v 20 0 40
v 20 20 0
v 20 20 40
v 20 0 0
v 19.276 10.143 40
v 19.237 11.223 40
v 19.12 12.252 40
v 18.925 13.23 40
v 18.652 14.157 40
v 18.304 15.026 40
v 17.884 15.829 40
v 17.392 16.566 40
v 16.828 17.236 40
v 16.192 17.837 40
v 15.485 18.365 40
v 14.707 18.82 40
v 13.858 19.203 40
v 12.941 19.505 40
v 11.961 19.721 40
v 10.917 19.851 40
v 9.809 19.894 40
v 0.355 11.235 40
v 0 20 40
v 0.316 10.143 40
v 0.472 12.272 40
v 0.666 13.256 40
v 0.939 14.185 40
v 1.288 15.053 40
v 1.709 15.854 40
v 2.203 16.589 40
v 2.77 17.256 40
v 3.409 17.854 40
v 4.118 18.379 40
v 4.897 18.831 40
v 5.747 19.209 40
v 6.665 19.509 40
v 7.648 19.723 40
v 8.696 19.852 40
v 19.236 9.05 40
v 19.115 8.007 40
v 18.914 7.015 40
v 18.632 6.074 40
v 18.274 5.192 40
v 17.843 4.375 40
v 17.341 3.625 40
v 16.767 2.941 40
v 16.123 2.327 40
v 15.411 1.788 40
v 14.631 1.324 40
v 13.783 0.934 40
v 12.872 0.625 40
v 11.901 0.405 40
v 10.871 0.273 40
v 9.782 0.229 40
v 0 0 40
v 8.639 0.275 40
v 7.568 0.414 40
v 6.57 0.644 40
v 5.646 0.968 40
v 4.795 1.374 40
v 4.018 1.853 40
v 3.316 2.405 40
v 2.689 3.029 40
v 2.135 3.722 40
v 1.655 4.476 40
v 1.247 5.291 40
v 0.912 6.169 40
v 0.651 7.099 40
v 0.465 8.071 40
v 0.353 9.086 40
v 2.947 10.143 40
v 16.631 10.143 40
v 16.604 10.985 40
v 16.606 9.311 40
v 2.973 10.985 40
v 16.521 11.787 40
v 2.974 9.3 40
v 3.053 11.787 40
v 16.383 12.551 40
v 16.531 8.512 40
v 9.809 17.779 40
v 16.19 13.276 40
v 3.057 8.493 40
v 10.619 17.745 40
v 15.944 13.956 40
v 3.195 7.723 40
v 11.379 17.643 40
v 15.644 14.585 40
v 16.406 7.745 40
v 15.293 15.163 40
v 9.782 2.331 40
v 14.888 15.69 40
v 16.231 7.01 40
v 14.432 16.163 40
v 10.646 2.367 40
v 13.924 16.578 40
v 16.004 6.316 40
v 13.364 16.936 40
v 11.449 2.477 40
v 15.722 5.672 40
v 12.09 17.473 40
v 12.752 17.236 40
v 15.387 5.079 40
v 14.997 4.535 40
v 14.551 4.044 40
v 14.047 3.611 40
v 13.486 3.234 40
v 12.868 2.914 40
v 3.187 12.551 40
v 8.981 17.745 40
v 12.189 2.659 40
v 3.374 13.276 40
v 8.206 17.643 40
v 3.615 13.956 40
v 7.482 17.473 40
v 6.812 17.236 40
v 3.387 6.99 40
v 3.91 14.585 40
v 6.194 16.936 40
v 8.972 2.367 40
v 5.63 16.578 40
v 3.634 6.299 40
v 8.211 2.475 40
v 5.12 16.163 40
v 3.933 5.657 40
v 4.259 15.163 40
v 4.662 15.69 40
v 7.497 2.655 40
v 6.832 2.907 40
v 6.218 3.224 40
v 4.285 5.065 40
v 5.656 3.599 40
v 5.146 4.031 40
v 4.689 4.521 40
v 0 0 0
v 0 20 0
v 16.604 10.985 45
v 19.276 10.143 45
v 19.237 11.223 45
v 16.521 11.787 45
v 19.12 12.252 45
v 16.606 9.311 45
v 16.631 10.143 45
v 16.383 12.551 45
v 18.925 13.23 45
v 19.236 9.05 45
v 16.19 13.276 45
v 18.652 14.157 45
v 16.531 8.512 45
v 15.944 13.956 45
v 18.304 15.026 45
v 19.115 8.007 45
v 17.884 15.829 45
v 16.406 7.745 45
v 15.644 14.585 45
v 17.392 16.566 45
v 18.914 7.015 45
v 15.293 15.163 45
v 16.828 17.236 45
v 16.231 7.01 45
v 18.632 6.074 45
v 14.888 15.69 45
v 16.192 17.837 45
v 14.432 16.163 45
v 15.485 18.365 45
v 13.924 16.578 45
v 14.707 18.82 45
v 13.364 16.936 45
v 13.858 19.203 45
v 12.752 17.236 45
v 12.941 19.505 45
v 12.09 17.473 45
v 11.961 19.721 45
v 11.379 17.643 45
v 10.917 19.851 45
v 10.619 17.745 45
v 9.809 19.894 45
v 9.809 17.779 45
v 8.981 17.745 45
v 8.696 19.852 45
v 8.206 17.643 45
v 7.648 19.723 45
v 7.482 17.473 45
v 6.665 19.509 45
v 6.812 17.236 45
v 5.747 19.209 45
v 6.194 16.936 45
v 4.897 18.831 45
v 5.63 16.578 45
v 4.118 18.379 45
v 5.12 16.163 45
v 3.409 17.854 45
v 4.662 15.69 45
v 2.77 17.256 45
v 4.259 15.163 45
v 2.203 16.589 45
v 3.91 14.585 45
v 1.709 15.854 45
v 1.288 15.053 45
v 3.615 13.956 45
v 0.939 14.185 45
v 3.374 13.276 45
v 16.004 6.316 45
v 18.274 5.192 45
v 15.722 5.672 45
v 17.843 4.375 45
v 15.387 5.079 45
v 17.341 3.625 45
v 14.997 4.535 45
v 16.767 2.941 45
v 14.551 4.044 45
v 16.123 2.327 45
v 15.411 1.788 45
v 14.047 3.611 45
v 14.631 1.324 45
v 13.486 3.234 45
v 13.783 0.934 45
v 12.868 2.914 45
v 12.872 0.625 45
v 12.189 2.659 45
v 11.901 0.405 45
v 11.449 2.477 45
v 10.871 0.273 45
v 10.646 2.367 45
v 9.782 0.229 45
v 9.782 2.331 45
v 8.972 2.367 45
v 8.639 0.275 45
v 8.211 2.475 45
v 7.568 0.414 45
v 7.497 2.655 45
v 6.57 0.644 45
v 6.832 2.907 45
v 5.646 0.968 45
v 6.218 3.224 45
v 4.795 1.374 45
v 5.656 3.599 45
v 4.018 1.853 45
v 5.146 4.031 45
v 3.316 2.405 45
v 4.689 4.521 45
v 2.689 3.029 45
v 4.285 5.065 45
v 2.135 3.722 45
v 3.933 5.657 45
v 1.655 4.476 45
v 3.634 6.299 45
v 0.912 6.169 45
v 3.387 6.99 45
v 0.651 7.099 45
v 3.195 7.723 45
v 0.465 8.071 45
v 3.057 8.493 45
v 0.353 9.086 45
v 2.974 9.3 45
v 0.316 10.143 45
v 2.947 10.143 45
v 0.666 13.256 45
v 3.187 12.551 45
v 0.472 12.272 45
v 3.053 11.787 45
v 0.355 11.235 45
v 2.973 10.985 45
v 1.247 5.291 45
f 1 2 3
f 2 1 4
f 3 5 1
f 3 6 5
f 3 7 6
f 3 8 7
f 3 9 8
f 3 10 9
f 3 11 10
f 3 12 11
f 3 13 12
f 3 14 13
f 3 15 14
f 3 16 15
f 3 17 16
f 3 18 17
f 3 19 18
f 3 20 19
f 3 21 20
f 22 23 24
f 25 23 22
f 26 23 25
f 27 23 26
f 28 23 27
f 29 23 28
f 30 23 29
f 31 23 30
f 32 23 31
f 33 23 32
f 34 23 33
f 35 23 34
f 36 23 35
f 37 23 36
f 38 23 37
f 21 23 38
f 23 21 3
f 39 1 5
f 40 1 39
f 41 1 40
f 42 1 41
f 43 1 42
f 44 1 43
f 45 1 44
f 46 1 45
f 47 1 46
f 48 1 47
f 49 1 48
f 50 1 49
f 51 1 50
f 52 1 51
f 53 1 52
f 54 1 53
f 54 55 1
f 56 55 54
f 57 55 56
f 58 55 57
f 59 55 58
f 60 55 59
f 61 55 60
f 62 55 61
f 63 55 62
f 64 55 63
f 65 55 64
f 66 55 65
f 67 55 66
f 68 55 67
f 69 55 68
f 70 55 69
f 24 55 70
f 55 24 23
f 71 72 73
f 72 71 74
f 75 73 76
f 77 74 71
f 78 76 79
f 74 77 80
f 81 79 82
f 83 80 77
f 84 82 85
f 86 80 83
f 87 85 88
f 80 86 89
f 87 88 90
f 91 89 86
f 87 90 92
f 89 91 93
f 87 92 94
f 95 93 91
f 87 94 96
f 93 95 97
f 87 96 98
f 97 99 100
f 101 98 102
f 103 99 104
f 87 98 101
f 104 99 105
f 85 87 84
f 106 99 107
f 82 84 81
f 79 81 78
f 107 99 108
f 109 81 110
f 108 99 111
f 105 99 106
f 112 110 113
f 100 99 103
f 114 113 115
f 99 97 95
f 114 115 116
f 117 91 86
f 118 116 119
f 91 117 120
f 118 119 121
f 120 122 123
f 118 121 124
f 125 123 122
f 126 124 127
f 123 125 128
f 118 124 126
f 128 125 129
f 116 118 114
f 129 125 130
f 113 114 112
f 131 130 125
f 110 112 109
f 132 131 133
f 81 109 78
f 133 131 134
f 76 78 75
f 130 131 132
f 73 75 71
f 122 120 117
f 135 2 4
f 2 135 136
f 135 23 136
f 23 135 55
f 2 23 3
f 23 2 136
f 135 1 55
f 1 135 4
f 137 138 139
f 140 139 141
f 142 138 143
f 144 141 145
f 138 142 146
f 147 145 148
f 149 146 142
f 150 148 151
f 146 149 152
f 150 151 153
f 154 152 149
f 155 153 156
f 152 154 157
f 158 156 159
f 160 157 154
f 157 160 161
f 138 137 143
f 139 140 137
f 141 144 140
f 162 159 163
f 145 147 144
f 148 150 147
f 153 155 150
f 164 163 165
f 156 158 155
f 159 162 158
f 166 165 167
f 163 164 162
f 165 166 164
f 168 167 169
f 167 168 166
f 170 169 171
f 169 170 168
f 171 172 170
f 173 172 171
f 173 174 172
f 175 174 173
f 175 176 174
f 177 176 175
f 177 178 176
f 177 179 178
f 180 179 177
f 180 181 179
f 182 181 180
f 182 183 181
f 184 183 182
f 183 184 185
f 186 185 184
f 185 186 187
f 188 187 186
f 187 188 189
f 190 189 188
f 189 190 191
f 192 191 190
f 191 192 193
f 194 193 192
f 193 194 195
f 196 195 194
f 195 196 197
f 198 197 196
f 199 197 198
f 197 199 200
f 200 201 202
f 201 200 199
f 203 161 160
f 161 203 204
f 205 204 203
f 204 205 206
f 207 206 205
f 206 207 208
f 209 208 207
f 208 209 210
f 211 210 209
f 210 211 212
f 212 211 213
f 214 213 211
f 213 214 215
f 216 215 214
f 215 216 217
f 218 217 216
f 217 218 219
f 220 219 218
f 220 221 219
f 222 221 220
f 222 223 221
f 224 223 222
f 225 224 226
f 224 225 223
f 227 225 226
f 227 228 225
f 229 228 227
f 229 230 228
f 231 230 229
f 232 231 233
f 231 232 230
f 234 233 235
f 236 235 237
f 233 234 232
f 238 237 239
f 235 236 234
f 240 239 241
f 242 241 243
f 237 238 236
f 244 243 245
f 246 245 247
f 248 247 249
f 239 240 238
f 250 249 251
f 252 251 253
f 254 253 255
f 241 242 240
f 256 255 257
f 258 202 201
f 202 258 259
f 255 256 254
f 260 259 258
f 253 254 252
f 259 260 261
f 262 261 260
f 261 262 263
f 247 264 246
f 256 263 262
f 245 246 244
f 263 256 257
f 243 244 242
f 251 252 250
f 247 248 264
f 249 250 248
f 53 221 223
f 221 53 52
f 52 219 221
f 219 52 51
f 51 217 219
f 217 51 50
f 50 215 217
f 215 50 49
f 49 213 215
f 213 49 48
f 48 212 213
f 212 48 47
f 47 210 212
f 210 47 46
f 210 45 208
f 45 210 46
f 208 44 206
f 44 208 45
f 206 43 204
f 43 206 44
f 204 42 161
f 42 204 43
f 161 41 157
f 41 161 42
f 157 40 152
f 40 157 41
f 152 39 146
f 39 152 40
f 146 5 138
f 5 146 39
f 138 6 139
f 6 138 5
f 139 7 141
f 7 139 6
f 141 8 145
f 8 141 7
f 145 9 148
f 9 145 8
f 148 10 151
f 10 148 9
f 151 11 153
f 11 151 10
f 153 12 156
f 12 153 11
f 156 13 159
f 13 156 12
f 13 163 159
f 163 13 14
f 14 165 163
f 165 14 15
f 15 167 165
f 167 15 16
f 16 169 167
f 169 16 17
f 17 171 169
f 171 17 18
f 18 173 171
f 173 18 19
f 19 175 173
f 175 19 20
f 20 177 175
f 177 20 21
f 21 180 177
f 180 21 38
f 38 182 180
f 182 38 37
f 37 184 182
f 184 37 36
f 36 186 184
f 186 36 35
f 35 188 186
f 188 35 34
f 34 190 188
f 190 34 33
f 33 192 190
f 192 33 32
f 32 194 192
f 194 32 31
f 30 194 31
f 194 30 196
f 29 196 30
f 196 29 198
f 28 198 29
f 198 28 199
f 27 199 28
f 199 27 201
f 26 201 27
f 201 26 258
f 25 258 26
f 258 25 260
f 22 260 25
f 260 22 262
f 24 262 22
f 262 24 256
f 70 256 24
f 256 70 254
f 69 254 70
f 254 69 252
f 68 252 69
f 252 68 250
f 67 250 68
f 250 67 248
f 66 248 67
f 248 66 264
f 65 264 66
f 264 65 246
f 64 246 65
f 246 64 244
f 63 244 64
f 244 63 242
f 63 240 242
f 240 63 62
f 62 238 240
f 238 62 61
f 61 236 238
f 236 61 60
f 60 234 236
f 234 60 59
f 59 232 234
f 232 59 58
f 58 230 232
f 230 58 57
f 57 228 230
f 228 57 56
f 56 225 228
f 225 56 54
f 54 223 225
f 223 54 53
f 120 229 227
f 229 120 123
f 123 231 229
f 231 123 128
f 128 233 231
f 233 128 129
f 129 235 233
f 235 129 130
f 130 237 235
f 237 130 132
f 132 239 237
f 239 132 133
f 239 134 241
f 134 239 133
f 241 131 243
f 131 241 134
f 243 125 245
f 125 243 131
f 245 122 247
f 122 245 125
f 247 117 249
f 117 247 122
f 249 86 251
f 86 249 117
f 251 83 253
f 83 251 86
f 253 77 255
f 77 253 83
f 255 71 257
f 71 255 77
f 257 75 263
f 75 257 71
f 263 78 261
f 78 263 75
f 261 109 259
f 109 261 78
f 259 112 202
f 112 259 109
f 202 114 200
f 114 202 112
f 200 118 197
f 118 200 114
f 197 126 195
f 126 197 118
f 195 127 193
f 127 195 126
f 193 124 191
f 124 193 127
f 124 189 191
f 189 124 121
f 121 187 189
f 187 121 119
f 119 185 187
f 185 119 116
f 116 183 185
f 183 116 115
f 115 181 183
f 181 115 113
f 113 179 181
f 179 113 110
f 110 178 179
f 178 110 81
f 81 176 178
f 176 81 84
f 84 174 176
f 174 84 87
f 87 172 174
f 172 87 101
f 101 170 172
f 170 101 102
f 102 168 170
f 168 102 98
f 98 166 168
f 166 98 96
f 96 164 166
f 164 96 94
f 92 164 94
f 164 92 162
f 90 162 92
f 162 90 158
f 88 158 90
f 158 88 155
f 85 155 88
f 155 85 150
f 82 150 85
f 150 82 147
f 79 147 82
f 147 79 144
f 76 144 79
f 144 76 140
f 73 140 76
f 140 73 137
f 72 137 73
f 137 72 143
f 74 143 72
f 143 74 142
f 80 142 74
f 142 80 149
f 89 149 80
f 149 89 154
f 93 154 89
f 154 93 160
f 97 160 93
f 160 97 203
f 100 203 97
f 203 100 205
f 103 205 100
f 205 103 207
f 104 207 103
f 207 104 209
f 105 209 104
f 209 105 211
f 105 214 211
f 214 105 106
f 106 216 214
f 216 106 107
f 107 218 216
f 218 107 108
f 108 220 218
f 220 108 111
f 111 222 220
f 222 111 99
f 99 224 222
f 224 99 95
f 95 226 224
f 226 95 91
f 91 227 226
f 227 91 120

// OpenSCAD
cube([20, 20, 40]);
translate([-1, 0.5, 40]){
    linear_extrude(5){
        text("O", size=20);
    }
}
